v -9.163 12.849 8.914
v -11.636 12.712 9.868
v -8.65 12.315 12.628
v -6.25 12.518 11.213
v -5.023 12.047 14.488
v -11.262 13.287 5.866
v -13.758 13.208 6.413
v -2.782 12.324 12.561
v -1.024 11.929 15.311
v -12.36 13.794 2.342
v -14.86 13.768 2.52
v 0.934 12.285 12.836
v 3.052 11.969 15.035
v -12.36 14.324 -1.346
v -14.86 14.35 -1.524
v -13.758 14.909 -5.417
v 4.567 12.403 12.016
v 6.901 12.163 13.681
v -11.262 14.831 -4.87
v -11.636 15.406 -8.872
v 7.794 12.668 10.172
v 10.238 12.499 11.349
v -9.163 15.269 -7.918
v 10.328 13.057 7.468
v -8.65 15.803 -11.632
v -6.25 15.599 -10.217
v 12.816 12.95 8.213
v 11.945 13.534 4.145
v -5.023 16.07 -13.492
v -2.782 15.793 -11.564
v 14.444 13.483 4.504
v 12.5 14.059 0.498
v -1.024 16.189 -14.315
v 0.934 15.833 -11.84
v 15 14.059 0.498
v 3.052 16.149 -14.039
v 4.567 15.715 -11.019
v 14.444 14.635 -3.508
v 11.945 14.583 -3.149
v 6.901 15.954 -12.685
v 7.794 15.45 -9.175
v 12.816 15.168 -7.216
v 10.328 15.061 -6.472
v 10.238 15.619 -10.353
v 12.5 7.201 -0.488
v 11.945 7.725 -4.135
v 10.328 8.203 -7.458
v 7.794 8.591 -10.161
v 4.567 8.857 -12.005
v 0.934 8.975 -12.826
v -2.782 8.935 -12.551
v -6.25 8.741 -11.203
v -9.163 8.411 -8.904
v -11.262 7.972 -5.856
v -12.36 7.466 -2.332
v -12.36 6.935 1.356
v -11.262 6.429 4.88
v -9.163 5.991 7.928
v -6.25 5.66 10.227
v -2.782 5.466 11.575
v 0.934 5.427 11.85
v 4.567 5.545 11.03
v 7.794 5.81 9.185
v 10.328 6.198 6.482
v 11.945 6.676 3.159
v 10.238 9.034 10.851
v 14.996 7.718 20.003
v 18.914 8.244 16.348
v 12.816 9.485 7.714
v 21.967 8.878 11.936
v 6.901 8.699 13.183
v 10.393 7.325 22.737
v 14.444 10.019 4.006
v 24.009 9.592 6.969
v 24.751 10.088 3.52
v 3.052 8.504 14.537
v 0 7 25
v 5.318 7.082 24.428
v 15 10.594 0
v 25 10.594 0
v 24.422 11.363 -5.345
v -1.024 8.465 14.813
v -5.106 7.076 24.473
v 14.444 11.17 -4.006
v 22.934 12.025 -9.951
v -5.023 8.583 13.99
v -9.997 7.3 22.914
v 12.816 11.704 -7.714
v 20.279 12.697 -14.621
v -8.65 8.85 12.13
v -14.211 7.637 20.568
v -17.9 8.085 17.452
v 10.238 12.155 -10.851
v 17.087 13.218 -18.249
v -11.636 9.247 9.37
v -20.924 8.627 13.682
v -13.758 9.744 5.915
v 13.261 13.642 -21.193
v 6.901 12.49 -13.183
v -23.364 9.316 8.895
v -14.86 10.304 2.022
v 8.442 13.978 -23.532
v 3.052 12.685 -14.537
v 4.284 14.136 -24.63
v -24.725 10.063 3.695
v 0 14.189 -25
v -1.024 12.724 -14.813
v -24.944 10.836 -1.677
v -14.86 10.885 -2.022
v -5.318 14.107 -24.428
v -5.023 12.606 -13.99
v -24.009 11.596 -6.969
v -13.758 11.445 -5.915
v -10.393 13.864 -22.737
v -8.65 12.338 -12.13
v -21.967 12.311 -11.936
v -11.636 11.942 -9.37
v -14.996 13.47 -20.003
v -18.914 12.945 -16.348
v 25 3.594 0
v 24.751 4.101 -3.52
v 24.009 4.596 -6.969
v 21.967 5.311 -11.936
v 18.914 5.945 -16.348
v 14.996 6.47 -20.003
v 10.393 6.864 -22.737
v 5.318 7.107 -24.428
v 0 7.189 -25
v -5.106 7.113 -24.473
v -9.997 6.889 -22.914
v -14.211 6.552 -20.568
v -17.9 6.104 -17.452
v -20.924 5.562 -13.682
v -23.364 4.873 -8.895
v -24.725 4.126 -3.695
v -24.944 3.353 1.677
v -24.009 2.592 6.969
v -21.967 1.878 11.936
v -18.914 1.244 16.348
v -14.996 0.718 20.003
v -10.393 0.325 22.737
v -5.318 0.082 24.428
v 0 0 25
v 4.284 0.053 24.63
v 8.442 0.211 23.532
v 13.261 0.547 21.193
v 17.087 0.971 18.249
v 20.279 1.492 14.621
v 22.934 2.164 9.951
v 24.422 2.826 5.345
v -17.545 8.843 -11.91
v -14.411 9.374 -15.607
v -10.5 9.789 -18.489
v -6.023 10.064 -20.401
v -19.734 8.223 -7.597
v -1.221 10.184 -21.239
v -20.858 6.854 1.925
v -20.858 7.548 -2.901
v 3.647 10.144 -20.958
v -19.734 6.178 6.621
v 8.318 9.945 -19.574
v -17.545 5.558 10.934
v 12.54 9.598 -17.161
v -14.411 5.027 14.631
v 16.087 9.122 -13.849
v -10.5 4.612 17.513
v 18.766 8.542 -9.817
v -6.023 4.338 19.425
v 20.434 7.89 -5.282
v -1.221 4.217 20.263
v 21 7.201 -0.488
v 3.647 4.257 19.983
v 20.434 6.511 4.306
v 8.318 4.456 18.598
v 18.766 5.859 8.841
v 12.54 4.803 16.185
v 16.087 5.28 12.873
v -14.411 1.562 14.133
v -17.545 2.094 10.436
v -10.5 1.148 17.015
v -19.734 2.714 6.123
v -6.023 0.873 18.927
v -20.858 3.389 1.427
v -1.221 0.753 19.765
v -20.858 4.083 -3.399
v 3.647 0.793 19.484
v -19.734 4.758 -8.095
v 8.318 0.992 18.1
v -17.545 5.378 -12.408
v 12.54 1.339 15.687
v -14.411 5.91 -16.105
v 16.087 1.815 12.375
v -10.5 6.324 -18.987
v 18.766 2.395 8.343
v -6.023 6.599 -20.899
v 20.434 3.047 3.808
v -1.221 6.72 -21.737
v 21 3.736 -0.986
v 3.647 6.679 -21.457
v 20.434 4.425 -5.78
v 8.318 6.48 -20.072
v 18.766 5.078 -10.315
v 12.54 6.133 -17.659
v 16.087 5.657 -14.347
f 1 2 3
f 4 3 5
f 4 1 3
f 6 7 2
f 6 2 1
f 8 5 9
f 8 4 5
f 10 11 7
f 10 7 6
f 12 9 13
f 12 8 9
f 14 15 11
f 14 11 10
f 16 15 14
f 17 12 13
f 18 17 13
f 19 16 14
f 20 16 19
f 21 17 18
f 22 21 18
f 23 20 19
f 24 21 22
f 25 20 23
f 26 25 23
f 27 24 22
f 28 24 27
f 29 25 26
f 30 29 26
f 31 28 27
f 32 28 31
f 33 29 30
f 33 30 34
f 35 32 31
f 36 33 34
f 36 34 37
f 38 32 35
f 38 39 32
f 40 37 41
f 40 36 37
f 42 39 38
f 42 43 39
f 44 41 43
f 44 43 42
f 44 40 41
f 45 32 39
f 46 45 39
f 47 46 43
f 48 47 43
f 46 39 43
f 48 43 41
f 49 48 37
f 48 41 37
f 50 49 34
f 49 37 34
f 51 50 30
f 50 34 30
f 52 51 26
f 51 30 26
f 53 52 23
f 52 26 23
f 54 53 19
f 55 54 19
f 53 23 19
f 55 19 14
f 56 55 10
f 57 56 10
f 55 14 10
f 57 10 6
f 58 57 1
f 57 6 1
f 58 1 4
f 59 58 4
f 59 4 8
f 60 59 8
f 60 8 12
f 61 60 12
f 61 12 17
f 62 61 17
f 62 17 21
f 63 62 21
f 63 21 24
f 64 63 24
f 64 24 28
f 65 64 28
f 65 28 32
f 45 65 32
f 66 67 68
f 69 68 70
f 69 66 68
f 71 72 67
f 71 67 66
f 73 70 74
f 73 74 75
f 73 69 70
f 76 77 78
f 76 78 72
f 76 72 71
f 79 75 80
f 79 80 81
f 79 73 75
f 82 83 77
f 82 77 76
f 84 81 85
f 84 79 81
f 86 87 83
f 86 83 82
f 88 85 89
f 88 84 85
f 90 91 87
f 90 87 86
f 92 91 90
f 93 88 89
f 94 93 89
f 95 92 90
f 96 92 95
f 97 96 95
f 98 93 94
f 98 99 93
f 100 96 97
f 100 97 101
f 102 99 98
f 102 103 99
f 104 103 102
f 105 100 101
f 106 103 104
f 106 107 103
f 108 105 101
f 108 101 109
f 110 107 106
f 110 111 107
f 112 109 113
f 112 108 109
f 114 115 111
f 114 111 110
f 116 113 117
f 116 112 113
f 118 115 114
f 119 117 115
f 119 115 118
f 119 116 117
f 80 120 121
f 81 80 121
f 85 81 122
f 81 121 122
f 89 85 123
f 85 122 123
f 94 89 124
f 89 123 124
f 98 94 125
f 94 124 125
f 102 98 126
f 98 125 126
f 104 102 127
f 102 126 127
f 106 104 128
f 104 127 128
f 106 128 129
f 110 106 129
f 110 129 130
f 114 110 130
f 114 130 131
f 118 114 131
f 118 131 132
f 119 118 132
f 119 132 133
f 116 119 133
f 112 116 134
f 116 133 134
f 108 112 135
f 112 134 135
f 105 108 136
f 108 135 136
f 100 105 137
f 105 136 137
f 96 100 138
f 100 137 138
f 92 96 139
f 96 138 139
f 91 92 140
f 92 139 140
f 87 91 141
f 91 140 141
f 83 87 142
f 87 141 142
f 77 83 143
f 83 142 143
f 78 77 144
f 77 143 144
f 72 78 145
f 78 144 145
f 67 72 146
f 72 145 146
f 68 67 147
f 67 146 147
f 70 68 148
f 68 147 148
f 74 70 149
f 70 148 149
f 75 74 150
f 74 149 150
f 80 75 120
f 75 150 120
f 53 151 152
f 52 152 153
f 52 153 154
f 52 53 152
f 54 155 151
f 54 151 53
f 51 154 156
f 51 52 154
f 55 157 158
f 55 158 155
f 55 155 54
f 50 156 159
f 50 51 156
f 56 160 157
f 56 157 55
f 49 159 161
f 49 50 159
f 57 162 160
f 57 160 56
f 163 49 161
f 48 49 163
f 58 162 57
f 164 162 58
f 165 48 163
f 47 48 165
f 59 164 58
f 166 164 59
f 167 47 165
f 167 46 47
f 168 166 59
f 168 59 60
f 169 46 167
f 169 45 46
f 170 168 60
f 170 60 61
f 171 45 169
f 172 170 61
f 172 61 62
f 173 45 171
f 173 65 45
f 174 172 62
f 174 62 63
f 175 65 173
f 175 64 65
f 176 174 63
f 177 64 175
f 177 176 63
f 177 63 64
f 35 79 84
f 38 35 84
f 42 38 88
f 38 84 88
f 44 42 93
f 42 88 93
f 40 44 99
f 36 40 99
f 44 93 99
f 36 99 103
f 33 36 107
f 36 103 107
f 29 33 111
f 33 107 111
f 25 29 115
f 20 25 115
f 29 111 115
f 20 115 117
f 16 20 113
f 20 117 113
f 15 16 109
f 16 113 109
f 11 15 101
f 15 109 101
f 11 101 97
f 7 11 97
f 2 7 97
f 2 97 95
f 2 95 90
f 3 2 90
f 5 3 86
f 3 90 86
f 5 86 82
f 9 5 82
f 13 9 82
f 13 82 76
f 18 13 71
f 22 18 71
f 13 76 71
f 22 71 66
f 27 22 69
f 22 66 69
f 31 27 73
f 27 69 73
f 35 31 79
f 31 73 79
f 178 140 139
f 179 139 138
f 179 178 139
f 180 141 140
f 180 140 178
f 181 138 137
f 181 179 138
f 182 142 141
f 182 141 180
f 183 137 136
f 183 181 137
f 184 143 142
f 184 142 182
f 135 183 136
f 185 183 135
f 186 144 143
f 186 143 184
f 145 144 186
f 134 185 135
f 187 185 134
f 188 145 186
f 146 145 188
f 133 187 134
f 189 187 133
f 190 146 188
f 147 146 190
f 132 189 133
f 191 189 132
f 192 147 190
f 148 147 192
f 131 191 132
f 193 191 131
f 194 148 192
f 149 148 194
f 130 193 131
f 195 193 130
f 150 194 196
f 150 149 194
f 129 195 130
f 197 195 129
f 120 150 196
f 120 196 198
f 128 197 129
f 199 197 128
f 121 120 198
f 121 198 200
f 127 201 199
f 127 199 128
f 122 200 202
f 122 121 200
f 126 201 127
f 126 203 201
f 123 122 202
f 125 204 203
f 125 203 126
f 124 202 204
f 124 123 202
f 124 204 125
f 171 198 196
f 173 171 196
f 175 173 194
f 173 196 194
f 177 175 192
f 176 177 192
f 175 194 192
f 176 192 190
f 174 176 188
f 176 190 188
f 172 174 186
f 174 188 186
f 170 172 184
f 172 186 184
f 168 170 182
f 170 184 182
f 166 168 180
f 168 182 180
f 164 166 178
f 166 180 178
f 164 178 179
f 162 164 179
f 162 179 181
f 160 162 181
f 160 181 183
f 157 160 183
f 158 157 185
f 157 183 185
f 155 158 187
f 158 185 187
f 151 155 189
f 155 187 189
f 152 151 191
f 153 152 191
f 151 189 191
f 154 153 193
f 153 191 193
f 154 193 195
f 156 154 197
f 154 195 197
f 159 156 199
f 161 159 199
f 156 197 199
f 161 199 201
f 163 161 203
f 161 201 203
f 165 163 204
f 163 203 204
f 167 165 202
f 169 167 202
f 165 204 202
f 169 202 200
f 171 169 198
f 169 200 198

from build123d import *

# Parameters (mm, degrees)
SKETCH_1_R          = 25
EXTRUDE_1_DEPTH     = 30
CUT_EXTRUDE_1_DEPTH = 31.5
SKETCH_10_R         = 15
EXTRUDE_2_DEPTH     = 3.5
SKETCH_11_R         = 21
CUT_EXTRUDE_8_DEPTH = 3.5
SKETCH_12_R         = 12.5
CUT_EXTRUDE_9_DEPTH = 23.5


with BuildPart() as part:
    # 草图1 → 凸台-拉伸1 (new body)
    with BuildSketch(Plane(origin=(0, 0, 0), x_dir=(1, 0, 0), z_dir=(0, 1, 0))):
        Circle(SKETCH_1_R)
    extrude(amount=EXTRUDE_1_DEPTH)

    # 草图3 → 切除-拉伸1 (cut, symmetric)
    with BuildSketch(Plane(origin=(0, 0, 0), x_dir=(0, 0, -1), z_dir=(1, 0, 0))):
        Polygon((-25, 7), (25, 14.188898505), (25, 39.510034579), (-25, 39.510034579), align=None)
        Polygon((-25, 0), (25, 7.188898505), (25, -11.572478834), (-25, -11.572478834), align=None)
    extrude(amount=CUT_EXTRUDE_1_DEPTH, both=True, mode=Mode.SUBTRACT)

    # 草图10 → 凸台-拉伸2 (add)
    with BuildSketch(Plane(origin=(0, 10.379875382, 1.492397412), x_dir=(1, 0, 0), z_dir=(0, 0.989821487, 0.142314524))):
        with Locations((0, 1.507744004)):
            Circle(SKETCH_10_R)
    extrude(amount=EXTRUDE_2_DEPTH)

    # 草图11 → 切除-拉伸8 (cut)
    with BuildSketch(Plane(origin=(0, 3.521649349, 0.506335595), x_dir=(1, 0, 0), z_dir=(0, -0.989821487, -0.142314524))):
        with Locations((0, -1.507744004)):
            Circle(SKETCH_11_R)
    extrude(amount=-CUT_EXTRUDE_8_DEPTH, mode=Mode.SUBTRACT)

    # 草图12 → 切除-拉伸9 (cut)
    with BuildSketch(Plane(origin=(0, 13.844250587, 1.990498247), x_dir=(1, 0, 0), z_dir=(0, 0.989821487, 0.142314524))):
        with Locations((0, 1.507744004)):
            Circle(SKETCH_12_R)
    extrude(amount=-CUT_EXTRUDE_9_DEPTH, mode=Mode.SUBTRACT)


solid = part.part
